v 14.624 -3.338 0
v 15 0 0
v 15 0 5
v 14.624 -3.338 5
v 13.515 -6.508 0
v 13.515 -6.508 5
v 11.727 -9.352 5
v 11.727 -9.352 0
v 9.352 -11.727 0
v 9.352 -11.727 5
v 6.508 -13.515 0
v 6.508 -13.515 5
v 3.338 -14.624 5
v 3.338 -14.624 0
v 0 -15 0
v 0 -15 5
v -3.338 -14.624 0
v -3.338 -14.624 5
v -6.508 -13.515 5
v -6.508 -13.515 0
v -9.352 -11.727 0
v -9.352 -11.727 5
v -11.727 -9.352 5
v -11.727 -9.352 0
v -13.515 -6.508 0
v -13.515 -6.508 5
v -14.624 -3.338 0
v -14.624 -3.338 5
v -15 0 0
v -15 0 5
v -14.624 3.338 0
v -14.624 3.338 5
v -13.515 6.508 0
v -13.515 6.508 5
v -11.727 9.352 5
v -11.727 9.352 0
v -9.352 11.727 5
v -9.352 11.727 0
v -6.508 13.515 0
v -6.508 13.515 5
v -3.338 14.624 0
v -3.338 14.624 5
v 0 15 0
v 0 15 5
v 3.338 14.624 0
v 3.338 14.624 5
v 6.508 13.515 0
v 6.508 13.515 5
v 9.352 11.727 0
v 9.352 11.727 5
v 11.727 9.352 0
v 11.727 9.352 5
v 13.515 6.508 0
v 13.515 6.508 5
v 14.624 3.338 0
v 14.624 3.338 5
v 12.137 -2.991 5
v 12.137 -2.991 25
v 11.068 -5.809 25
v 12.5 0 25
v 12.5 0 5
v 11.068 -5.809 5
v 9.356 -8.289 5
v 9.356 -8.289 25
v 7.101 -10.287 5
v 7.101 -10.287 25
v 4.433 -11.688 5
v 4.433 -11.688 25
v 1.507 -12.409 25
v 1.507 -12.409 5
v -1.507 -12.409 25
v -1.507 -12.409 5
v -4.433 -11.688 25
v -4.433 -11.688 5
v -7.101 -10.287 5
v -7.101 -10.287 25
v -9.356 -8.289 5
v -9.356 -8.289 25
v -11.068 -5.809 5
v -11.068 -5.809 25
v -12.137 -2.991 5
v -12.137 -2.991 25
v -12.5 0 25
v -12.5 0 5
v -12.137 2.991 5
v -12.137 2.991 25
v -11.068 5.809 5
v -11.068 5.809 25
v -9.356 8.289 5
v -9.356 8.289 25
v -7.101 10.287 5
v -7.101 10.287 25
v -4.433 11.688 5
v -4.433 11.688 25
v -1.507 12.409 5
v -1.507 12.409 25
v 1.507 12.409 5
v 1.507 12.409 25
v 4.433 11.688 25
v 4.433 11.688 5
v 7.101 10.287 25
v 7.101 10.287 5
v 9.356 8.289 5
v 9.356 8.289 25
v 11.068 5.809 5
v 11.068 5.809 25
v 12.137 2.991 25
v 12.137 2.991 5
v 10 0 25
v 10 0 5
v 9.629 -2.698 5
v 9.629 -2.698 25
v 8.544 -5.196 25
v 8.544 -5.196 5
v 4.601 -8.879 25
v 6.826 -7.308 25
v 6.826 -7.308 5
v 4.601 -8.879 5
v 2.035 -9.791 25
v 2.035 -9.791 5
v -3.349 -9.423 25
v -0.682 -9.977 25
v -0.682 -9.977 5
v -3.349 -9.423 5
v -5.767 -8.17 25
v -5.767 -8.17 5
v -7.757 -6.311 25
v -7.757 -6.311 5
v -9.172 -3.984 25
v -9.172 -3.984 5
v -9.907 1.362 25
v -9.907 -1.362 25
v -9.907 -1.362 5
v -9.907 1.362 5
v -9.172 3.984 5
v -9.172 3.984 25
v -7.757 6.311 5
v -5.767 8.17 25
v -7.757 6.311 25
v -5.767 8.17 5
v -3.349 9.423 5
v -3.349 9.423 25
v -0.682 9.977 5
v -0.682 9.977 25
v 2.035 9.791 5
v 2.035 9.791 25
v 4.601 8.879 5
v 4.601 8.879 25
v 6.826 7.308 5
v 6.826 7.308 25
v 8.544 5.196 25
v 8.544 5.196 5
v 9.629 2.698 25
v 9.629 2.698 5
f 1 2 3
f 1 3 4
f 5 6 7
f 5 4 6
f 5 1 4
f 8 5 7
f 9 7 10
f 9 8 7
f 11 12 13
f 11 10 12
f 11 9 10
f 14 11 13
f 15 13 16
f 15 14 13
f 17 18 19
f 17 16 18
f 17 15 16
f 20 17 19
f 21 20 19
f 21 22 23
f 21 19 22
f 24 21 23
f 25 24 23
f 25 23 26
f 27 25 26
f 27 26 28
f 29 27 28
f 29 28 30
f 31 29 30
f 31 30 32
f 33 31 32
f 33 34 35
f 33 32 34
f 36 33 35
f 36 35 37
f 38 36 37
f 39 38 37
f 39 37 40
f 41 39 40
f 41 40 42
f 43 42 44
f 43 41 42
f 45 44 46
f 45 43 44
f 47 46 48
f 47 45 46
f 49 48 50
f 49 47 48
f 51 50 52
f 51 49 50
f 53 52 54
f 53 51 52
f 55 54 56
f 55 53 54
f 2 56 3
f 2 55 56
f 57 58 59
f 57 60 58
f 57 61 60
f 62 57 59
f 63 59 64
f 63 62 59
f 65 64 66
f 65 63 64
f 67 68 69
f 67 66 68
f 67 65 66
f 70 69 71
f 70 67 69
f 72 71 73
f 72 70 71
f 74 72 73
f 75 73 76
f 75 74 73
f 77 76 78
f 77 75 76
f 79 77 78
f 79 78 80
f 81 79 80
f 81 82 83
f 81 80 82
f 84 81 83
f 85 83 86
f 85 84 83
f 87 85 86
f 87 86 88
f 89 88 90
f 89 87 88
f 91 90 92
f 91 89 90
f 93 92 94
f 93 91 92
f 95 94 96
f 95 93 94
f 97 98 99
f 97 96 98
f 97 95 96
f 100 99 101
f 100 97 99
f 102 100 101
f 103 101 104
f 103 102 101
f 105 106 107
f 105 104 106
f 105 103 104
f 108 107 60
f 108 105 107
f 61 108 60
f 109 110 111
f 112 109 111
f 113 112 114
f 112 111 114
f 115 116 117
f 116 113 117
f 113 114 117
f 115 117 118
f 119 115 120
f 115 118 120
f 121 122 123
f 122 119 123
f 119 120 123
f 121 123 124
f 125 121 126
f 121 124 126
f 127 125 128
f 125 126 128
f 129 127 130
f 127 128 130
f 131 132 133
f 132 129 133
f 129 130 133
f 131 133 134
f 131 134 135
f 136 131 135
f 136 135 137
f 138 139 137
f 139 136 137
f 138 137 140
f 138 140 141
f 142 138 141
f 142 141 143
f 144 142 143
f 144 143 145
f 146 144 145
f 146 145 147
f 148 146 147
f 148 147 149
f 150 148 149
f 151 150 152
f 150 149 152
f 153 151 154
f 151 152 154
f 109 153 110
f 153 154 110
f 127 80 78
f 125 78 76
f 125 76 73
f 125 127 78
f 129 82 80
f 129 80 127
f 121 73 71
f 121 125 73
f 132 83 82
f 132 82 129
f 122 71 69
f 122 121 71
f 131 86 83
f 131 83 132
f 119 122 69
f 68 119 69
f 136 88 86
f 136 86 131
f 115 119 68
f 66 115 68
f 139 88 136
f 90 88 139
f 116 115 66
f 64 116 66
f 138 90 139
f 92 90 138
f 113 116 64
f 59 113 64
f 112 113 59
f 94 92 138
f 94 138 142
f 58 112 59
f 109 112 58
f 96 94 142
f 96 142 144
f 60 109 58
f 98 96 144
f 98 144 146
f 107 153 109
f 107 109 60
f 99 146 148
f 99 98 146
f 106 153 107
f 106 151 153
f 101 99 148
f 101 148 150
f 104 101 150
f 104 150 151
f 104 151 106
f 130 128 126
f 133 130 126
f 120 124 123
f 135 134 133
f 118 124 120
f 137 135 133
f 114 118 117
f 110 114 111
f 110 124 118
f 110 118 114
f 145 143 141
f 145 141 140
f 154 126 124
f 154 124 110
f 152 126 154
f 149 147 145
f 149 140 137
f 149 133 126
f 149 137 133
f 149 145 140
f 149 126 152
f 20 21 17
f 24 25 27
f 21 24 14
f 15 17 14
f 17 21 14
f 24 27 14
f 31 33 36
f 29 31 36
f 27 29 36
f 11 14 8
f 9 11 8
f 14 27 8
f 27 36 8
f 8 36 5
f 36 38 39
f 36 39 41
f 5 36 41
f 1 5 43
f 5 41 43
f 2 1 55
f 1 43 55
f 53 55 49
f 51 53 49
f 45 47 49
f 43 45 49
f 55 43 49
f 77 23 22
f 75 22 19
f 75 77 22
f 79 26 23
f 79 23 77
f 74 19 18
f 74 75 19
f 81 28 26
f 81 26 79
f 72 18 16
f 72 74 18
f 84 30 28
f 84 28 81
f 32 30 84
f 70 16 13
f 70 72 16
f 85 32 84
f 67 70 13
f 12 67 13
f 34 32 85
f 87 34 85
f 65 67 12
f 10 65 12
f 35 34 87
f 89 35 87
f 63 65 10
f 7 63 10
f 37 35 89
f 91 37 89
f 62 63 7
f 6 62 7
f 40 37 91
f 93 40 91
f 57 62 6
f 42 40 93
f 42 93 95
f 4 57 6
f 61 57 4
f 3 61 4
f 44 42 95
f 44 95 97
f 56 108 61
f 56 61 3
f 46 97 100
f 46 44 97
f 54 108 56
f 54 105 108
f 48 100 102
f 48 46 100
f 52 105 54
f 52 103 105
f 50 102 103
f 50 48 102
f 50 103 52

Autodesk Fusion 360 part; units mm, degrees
sketch "Sketch1" plane through (0, 0, 0) normal (0, 0, 1) x (1, 0, 0)
  circle A0 centre (0, 0) radius 10
  circle A1 centre (0, 0) radius 12.5
  circle A2 centre (0, 0) radius 15
  dimension "d1" = 20
  dimension "d2" = 25
  dimension "d3" = 30
extrude "Extrude1" add sketch "Sketch1" along normal blind 25 contours A1
extrude "Extrude2" add sketch "Sketch1" along normal blind 5 contours A2
extrude "Extrude3" add sketch "Sketch1" along normal blind 5 contours A0
